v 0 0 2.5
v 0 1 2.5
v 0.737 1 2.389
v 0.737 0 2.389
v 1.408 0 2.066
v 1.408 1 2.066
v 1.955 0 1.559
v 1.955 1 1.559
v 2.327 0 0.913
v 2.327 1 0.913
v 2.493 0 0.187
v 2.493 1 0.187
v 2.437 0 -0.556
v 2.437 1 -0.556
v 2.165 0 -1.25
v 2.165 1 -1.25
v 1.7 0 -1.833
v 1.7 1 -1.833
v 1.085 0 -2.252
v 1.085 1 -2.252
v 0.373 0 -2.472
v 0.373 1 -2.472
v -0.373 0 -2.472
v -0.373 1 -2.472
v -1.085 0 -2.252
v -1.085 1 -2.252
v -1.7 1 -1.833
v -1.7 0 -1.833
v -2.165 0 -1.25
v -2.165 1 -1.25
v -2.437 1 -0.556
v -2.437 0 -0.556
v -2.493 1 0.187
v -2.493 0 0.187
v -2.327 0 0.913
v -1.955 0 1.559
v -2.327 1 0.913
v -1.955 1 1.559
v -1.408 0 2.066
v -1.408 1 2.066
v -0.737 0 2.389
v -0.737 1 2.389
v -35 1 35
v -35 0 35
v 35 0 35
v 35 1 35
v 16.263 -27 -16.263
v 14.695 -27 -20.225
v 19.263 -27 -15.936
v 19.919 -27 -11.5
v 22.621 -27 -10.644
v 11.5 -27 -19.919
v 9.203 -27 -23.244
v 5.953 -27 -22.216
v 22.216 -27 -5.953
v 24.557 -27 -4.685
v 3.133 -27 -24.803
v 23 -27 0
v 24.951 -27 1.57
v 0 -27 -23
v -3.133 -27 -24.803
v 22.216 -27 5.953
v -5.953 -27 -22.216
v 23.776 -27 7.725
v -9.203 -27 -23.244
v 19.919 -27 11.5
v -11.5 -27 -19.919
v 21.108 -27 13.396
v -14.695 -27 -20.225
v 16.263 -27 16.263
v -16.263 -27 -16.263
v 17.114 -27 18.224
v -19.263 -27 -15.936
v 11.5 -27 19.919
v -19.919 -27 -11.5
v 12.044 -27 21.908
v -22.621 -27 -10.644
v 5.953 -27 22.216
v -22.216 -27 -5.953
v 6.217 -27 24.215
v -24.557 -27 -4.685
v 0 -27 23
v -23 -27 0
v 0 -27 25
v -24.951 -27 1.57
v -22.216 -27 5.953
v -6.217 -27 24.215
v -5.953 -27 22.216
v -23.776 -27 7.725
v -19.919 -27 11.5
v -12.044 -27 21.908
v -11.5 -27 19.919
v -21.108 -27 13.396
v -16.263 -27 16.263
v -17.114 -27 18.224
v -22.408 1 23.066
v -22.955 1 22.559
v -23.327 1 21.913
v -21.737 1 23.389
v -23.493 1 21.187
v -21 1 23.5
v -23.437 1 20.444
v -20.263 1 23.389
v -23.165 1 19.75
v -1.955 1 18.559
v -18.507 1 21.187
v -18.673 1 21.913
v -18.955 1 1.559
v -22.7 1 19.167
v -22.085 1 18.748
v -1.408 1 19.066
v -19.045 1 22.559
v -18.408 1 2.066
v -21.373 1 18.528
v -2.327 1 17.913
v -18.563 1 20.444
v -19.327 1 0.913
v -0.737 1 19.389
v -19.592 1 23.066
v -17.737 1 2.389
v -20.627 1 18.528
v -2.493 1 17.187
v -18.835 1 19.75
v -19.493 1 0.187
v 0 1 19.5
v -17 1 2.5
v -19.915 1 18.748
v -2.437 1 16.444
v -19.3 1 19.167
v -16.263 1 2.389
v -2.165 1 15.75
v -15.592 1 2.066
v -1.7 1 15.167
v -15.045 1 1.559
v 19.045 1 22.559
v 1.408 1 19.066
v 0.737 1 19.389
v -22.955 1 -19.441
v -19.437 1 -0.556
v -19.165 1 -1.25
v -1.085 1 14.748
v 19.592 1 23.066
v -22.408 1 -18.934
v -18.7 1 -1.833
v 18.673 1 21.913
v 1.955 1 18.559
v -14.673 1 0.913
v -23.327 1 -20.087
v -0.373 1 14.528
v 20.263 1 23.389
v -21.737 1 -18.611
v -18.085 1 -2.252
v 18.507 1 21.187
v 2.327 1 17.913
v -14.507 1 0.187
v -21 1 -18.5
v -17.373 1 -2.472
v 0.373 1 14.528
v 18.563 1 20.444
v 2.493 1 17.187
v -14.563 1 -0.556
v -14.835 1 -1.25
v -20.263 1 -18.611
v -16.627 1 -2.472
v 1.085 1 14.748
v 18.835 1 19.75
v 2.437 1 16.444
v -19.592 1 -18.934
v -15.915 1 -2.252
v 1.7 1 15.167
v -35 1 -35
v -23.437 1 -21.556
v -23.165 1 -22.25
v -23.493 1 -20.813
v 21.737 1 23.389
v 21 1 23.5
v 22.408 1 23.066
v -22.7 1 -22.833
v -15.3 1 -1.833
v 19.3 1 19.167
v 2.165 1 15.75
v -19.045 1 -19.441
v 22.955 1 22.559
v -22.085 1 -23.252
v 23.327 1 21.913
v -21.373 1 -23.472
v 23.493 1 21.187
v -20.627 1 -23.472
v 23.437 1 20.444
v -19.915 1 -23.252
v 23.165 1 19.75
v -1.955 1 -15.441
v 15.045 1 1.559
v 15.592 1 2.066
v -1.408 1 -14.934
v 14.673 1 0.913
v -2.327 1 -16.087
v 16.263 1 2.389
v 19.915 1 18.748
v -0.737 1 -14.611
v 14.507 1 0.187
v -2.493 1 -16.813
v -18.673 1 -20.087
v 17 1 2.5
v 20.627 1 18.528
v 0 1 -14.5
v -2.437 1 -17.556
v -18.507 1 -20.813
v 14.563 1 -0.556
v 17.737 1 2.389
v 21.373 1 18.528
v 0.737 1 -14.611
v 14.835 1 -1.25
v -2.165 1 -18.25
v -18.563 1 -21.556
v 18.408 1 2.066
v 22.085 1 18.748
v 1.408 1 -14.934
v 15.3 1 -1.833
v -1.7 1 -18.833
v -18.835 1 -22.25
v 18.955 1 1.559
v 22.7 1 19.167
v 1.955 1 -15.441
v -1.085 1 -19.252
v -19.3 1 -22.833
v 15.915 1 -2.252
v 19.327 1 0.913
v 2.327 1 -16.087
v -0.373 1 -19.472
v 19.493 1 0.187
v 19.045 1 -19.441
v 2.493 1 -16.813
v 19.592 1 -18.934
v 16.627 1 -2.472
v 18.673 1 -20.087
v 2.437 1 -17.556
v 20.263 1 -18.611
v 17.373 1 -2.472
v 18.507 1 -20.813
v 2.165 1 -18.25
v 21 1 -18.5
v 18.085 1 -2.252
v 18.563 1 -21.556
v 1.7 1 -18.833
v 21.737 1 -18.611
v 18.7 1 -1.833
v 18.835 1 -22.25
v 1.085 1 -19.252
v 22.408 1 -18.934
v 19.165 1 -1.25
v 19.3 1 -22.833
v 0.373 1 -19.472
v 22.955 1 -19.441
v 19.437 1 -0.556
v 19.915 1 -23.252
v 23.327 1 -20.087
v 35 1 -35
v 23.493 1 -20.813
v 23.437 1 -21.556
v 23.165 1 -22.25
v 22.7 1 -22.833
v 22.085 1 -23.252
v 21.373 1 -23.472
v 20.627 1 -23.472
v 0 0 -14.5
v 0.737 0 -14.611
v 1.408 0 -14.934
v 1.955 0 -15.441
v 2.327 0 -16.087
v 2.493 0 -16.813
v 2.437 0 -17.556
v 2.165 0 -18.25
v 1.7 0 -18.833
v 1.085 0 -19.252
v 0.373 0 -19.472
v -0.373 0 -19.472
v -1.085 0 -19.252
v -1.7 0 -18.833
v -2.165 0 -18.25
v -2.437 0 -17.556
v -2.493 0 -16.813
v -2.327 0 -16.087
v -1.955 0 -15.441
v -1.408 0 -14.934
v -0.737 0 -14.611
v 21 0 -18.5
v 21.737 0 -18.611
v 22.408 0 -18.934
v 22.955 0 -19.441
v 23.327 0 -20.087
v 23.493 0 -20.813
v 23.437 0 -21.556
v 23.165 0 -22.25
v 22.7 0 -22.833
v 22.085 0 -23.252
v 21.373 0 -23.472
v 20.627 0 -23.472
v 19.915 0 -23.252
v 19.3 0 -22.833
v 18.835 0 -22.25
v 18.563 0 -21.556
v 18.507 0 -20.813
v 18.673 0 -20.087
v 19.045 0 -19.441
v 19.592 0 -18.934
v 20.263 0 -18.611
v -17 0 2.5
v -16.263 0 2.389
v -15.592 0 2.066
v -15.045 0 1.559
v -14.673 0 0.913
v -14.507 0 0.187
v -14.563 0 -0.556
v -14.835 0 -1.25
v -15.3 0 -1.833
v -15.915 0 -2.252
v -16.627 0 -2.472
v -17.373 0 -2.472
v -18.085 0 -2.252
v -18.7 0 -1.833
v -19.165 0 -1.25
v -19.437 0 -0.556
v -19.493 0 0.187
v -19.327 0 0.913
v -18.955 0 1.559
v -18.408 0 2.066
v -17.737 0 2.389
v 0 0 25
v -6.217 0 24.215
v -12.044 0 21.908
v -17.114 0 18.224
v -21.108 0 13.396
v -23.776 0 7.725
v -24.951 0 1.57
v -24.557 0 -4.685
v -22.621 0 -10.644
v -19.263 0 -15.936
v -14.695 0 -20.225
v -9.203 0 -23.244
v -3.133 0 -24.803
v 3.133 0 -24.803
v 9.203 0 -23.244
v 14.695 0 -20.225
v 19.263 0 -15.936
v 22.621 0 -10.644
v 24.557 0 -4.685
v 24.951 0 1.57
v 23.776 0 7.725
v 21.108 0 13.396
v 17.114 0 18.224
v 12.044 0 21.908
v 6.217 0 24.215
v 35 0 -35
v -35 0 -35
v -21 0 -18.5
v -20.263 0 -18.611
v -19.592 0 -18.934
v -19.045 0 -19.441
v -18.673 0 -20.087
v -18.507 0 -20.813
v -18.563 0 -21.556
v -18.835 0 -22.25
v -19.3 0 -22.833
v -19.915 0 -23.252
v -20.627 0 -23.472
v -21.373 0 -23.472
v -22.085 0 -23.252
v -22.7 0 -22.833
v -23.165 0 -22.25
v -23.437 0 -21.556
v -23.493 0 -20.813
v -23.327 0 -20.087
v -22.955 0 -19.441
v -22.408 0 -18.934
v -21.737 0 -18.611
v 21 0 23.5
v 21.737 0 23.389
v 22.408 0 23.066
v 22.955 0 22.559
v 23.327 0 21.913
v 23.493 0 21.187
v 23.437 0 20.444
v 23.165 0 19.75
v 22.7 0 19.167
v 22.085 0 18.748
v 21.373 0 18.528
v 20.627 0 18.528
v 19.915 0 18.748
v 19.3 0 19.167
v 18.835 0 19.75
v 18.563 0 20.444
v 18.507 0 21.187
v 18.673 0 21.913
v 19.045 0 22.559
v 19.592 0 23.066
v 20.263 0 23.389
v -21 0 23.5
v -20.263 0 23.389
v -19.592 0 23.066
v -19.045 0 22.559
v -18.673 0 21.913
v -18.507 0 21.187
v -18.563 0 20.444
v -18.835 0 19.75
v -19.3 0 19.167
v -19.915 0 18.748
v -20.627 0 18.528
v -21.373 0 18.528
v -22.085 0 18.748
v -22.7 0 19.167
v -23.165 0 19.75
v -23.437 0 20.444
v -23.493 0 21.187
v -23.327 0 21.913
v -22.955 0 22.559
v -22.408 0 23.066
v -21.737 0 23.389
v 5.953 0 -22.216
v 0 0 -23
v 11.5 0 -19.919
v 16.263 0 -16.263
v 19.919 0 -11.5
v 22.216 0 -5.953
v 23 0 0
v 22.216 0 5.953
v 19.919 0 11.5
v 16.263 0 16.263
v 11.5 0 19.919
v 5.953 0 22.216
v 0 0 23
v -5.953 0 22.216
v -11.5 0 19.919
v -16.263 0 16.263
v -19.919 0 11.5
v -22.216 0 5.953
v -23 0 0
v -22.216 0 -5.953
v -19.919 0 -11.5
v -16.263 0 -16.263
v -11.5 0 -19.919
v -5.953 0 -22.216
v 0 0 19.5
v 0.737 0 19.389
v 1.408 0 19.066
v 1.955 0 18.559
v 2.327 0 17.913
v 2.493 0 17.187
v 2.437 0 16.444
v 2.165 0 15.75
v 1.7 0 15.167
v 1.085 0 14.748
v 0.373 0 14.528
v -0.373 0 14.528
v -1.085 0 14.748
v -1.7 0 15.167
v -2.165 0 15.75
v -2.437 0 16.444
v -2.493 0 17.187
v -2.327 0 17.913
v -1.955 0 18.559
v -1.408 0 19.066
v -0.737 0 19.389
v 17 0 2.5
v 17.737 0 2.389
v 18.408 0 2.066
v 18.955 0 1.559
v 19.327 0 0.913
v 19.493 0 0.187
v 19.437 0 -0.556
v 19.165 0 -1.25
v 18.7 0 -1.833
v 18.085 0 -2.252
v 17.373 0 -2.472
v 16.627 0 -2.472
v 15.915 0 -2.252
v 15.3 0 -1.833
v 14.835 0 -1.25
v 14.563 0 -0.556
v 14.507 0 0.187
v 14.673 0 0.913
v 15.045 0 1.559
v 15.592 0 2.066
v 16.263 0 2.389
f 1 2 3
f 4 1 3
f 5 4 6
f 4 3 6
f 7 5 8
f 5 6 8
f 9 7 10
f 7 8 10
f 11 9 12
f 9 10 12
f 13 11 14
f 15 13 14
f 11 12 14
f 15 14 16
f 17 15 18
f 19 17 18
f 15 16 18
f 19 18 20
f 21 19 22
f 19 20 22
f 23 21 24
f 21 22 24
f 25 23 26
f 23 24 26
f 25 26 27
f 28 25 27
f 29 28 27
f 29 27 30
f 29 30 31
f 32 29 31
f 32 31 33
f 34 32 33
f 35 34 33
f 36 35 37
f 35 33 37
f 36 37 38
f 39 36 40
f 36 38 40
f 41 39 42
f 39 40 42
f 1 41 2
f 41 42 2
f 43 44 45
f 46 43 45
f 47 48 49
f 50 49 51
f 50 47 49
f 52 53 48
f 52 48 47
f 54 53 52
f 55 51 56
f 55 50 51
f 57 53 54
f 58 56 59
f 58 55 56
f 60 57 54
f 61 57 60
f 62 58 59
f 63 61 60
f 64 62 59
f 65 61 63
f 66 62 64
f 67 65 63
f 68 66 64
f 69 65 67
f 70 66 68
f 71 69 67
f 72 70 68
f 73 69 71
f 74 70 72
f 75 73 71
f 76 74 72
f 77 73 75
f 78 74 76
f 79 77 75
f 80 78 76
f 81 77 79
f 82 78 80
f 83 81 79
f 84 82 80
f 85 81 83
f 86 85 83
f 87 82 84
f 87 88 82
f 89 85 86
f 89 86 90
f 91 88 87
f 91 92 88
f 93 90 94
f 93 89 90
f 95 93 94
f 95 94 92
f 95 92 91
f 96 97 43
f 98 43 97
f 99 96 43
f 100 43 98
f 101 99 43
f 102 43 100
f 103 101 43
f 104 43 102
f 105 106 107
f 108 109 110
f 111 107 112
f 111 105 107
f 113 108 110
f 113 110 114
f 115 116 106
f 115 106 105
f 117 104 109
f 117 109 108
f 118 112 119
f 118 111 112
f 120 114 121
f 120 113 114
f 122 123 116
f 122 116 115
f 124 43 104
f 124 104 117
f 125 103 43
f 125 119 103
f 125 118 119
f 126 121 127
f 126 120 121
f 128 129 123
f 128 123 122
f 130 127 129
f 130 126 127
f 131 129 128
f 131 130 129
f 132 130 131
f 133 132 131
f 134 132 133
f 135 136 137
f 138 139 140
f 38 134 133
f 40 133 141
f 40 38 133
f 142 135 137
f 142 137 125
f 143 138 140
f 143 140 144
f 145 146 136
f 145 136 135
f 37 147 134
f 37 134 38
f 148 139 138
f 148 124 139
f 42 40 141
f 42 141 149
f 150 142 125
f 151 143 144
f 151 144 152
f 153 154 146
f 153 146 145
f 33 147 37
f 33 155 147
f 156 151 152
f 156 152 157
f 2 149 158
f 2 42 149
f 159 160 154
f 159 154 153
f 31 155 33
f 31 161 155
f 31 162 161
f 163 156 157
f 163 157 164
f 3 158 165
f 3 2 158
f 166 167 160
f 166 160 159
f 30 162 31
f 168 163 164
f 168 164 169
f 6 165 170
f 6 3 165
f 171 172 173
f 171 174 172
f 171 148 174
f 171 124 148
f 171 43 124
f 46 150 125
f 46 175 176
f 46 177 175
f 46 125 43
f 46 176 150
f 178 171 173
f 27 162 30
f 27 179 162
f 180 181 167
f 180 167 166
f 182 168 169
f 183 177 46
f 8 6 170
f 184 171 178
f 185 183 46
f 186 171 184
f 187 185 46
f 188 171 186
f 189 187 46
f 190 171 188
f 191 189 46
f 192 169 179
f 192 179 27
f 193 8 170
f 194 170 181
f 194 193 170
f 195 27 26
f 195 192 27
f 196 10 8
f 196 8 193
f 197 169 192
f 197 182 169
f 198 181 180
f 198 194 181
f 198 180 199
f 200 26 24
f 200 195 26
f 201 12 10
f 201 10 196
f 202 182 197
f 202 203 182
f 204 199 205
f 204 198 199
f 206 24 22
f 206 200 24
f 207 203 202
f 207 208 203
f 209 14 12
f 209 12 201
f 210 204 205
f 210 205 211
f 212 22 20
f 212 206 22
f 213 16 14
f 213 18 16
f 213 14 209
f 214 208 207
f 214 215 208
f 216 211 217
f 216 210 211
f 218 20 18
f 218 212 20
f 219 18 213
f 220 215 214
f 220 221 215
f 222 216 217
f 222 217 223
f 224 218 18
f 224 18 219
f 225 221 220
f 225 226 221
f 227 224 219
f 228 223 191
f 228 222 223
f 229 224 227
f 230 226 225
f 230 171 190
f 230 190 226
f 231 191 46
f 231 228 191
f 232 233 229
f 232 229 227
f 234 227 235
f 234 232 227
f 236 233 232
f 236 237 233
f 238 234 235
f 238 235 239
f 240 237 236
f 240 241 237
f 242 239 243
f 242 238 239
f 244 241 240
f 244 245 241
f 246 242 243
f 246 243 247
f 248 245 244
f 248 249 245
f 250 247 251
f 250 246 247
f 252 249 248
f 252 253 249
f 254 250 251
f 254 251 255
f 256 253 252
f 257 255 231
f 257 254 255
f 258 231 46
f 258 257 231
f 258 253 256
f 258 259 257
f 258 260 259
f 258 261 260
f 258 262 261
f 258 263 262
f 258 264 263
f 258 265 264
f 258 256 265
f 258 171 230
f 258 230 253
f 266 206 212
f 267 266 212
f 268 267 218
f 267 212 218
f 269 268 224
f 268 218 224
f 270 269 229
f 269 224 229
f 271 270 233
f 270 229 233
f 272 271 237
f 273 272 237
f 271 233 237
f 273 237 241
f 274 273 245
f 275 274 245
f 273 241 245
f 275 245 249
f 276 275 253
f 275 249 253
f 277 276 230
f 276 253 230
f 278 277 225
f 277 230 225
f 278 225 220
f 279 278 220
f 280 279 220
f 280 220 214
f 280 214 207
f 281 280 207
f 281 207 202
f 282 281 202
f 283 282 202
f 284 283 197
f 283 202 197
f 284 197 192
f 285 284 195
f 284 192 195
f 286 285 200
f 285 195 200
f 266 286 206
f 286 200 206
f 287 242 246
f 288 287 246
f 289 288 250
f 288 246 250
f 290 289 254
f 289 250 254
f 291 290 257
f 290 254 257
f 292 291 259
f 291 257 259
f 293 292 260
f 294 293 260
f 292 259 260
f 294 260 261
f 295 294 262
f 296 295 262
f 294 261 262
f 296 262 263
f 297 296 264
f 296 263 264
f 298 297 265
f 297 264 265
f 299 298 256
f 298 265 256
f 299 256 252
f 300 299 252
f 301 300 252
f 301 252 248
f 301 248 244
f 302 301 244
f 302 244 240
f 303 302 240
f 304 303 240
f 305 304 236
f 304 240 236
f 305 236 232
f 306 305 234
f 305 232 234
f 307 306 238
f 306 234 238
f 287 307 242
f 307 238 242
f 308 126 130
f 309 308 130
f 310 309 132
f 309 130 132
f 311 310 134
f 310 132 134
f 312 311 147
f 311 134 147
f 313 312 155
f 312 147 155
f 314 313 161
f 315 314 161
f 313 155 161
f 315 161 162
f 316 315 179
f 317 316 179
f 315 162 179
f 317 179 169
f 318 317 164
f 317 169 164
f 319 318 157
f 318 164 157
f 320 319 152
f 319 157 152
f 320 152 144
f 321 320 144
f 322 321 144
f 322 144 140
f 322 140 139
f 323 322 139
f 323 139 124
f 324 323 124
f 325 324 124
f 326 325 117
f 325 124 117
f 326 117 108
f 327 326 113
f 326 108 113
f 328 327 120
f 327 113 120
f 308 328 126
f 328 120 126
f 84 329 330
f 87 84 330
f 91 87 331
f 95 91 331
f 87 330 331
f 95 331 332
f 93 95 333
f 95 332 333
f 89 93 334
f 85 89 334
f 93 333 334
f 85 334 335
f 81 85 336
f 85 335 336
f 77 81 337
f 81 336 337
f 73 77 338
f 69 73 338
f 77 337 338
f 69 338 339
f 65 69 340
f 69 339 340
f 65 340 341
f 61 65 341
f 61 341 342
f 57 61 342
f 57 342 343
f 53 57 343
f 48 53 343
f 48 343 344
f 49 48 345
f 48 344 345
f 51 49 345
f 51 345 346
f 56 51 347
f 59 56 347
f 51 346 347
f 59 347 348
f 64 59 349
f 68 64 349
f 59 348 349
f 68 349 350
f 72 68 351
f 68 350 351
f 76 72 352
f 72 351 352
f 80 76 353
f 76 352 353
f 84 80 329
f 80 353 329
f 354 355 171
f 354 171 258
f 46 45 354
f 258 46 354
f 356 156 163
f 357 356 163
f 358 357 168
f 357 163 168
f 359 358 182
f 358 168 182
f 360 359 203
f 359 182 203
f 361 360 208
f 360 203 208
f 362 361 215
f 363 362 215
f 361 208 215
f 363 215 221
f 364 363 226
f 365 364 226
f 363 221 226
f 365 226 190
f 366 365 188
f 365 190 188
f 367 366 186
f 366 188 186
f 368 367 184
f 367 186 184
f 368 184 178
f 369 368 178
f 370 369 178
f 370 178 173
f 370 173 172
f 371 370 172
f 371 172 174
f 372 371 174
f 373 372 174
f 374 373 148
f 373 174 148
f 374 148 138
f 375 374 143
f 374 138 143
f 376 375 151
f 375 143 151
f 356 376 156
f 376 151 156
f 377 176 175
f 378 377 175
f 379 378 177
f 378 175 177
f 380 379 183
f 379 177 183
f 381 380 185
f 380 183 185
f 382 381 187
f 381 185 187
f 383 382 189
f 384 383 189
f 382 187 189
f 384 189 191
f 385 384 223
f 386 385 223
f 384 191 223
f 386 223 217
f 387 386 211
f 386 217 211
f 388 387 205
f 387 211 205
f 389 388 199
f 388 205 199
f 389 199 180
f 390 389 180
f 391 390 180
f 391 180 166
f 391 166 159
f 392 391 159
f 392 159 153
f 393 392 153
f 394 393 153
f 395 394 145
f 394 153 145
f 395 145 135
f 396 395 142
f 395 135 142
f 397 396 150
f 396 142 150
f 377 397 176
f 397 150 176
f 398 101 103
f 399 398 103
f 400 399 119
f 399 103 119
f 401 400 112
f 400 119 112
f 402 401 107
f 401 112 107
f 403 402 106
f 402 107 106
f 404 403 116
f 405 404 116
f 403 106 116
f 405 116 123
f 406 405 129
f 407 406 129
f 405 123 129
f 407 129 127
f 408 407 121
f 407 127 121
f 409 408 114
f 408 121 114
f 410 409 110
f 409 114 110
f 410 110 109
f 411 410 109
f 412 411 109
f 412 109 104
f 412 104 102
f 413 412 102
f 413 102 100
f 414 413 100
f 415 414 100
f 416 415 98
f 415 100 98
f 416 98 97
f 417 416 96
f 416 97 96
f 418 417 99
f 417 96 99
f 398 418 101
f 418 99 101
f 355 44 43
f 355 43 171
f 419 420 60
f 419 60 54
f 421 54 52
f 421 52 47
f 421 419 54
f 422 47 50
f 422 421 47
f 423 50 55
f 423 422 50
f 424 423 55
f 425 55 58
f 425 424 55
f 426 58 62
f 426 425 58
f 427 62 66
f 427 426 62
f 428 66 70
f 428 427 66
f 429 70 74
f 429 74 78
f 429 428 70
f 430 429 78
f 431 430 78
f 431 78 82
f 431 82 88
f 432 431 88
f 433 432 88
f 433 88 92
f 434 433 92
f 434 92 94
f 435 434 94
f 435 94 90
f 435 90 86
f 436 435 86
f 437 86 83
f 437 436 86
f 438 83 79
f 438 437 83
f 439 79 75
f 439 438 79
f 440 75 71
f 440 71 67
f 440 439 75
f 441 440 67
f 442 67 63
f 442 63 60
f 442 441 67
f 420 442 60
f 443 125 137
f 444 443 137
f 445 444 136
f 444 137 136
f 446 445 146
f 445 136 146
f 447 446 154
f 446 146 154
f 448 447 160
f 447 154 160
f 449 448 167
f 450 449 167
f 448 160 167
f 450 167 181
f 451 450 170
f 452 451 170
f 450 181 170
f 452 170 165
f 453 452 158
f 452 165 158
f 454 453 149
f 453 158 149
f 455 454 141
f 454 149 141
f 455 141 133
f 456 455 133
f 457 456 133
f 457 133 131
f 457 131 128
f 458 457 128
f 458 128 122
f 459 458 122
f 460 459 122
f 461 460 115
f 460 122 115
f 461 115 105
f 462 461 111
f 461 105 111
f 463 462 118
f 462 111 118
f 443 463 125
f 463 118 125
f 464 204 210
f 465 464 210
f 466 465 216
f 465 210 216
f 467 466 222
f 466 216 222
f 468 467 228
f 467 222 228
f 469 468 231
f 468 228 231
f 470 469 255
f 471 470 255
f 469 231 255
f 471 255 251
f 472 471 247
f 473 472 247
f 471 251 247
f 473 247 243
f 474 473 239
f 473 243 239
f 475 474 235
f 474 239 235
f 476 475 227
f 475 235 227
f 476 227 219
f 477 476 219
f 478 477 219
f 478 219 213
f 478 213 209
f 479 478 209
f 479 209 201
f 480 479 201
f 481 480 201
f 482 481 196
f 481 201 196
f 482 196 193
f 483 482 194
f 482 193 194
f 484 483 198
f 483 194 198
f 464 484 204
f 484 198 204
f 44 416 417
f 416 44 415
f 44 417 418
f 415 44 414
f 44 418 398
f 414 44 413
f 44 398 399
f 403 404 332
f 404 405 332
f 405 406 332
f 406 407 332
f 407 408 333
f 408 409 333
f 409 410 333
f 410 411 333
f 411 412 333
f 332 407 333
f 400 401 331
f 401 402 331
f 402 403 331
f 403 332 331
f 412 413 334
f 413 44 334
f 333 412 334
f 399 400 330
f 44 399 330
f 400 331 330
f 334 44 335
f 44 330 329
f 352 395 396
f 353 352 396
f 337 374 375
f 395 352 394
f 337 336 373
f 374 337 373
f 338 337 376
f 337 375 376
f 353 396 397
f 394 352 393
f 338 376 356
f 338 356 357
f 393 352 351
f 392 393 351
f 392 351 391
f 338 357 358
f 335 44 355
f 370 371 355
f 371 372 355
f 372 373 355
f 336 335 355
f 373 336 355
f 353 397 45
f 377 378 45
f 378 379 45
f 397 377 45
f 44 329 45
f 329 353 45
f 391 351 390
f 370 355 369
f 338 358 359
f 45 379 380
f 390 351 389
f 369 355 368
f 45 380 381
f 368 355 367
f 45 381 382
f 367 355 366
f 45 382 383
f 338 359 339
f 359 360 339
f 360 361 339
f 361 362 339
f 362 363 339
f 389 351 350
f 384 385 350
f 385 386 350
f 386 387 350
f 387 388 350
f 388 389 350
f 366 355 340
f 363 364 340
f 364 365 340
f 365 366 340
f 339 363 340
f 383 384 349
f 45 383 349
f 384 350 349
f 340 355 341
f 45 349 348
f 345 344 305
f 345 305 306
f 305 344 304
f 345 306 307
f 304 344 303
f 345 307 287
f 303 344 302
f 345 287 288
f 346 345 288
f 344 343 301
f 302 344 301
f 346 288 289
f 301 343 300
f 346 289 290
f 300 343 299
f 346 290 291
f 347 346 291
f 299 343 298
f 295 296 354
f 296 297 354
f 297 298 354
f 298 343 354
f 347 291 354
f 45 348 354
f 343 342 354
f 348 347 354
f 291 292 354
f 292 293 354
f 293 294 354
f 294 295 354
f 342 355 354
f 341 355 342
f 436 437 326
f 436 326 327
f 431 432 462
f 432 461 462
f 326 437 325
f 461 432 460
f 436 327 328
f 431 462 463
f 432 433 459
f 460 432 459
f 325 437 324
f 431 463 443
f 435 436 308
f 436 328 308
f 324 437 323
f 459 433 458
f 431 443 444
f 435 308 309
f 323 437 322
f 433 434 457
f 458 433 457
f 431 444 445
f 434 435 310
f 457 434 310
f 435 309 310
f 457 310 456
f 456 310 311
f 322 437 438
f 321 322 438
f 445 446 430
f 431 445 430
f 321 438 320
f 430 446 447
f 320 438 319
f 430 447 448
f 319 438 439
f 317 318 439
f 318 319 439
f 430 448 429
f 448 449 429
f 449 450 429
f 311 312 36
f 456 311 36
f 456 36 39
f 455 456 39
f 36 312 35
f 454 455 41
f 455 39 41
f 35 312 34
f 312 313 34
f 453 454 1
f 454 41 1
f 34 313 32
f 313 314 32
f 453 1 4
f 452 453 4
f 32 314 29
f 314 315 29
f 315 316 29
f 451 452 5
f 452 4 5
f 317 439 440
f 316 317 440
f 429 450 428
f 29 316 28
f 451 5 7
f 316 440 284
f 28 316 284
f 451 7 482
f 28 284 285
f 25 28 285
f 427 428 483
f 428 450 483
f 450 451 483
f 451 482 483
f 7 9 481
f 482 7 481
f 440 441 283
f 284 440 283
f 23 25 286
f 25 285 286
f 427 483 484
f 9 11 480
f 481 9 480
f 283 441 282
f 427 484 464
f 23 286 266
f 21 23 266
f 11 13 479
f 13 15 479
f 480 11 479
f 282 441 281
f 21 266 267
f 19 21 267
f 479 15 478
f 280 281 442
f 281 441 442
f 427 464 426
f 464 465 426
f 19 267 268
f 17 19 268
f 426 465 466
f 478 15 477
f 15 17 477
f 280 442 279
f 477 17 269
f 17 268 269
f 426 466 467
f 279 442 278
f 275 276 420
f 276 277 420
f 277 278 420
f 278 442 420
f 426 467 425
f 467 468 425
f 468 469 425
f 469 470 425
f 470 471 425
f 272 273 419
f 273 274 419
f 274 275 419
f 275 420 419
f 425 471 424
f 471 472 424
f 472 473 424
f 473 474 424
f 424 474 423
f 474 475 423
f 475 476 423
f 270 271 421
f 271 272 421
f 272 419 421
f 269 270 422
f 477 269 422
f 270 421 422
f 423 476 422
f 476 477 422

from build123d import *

# Parameters (mm, degrees)
SKETCH1_W           = 70
SKETCH1_H           = 70
BOSS_EXTRUDE1_DEPTH = 1
SKETCH2_R           = 25
SKETCH2_R_2         = 23
BOSS_EXTRUDE2_DEPTH = 27
SKETCH3_R           = 2.5
CUT_EXTRUDE1_DEPTH  = 1
SKETCH4_R           = 2.5
CUT_EXTRUDE2_DEPTH  = 1


with BuildPart() as part:
    # Sketch1 → Boss-Extrude1 (new body)
    with BuildSketch(Plane(origin=(0, 0, 0), x_dir=(1, 0, 0), z_dir=(0, 1, 0))):
        Rectangle(SKETCH1_W, SKETCH1_H)
    extrude(amount=BOSS_EXTRUDE1_DEPTH)

    # Sketch2 → Boss-Extrude2 (add)
    with BuildSketch(Plane.XZ):
        with Locations(Location((0, 0, 0), (0, 0, 90))):
            Circle(SKETCH2_R)
        with Locations(Location((0, 0, 0), (0, 0, 270))):
            Circle(SKETCH2_R_2, mode=Mode.SUBTRACT)
    extrude(amount=BOSS_EXTRUDE2_DEPTH)

    # Sketch3 → Cut-Extrude1 (cut)
    with BuildSketch(Plane(origin=(0, 1, 0), x_dir=(1, 0, 0), z_dir=(0, 1, 0))):
        with Locations(Location((0, 0, 0), (0, 0, 270))):
            Circle(SKETCH3_R)
        with Locations(Location((0, 17, 0), (0, 0, 270))):
            Circle(SKETCH3_R)
        with Locations(Location((17, 0, 0), (0, 0, 270))):
            Circle(SKETCH3_R)
        with Locations(Location((0, -17, 0), (0, 0, 270))):
            Circle(SKETCH3_R)
        with Locations(Location((-17, 0, 0), (0, 0, 270))):
            Circle(SKETCH3_R)
    extrude(amount=-CUT_EXTRUDE1_DEPTH, mode=Mode.SUBTRACT)

    # Sketch4 → Cut-Extrude2 (cut)
    with BuildSketch(Plane(origin=(0, 1, 0), x_dir=(1, 0, 0), z_dir=(0, 1, 0))):
        with Locations(Location((21, 21, 0), (0, 0, 270))):
            Circle(SKETCH4_R)
        with Locations(Location((21, -21, 0), (0, 0, 270))):
            Circle(SKETCH4_R)
        with Locations(Location((-21, 21, 0), (0, 0, 270))):
            Circle(SKETCH4_R)
        with Locations(Location((-21, -21, 0), (0, 0, 270))):
            Circle(SKETCH4_R)
    extrude(amount=-CUT_EXTRUDE2_DEPTH, mode=Mode.SUBTRACT)


solid = part.part
